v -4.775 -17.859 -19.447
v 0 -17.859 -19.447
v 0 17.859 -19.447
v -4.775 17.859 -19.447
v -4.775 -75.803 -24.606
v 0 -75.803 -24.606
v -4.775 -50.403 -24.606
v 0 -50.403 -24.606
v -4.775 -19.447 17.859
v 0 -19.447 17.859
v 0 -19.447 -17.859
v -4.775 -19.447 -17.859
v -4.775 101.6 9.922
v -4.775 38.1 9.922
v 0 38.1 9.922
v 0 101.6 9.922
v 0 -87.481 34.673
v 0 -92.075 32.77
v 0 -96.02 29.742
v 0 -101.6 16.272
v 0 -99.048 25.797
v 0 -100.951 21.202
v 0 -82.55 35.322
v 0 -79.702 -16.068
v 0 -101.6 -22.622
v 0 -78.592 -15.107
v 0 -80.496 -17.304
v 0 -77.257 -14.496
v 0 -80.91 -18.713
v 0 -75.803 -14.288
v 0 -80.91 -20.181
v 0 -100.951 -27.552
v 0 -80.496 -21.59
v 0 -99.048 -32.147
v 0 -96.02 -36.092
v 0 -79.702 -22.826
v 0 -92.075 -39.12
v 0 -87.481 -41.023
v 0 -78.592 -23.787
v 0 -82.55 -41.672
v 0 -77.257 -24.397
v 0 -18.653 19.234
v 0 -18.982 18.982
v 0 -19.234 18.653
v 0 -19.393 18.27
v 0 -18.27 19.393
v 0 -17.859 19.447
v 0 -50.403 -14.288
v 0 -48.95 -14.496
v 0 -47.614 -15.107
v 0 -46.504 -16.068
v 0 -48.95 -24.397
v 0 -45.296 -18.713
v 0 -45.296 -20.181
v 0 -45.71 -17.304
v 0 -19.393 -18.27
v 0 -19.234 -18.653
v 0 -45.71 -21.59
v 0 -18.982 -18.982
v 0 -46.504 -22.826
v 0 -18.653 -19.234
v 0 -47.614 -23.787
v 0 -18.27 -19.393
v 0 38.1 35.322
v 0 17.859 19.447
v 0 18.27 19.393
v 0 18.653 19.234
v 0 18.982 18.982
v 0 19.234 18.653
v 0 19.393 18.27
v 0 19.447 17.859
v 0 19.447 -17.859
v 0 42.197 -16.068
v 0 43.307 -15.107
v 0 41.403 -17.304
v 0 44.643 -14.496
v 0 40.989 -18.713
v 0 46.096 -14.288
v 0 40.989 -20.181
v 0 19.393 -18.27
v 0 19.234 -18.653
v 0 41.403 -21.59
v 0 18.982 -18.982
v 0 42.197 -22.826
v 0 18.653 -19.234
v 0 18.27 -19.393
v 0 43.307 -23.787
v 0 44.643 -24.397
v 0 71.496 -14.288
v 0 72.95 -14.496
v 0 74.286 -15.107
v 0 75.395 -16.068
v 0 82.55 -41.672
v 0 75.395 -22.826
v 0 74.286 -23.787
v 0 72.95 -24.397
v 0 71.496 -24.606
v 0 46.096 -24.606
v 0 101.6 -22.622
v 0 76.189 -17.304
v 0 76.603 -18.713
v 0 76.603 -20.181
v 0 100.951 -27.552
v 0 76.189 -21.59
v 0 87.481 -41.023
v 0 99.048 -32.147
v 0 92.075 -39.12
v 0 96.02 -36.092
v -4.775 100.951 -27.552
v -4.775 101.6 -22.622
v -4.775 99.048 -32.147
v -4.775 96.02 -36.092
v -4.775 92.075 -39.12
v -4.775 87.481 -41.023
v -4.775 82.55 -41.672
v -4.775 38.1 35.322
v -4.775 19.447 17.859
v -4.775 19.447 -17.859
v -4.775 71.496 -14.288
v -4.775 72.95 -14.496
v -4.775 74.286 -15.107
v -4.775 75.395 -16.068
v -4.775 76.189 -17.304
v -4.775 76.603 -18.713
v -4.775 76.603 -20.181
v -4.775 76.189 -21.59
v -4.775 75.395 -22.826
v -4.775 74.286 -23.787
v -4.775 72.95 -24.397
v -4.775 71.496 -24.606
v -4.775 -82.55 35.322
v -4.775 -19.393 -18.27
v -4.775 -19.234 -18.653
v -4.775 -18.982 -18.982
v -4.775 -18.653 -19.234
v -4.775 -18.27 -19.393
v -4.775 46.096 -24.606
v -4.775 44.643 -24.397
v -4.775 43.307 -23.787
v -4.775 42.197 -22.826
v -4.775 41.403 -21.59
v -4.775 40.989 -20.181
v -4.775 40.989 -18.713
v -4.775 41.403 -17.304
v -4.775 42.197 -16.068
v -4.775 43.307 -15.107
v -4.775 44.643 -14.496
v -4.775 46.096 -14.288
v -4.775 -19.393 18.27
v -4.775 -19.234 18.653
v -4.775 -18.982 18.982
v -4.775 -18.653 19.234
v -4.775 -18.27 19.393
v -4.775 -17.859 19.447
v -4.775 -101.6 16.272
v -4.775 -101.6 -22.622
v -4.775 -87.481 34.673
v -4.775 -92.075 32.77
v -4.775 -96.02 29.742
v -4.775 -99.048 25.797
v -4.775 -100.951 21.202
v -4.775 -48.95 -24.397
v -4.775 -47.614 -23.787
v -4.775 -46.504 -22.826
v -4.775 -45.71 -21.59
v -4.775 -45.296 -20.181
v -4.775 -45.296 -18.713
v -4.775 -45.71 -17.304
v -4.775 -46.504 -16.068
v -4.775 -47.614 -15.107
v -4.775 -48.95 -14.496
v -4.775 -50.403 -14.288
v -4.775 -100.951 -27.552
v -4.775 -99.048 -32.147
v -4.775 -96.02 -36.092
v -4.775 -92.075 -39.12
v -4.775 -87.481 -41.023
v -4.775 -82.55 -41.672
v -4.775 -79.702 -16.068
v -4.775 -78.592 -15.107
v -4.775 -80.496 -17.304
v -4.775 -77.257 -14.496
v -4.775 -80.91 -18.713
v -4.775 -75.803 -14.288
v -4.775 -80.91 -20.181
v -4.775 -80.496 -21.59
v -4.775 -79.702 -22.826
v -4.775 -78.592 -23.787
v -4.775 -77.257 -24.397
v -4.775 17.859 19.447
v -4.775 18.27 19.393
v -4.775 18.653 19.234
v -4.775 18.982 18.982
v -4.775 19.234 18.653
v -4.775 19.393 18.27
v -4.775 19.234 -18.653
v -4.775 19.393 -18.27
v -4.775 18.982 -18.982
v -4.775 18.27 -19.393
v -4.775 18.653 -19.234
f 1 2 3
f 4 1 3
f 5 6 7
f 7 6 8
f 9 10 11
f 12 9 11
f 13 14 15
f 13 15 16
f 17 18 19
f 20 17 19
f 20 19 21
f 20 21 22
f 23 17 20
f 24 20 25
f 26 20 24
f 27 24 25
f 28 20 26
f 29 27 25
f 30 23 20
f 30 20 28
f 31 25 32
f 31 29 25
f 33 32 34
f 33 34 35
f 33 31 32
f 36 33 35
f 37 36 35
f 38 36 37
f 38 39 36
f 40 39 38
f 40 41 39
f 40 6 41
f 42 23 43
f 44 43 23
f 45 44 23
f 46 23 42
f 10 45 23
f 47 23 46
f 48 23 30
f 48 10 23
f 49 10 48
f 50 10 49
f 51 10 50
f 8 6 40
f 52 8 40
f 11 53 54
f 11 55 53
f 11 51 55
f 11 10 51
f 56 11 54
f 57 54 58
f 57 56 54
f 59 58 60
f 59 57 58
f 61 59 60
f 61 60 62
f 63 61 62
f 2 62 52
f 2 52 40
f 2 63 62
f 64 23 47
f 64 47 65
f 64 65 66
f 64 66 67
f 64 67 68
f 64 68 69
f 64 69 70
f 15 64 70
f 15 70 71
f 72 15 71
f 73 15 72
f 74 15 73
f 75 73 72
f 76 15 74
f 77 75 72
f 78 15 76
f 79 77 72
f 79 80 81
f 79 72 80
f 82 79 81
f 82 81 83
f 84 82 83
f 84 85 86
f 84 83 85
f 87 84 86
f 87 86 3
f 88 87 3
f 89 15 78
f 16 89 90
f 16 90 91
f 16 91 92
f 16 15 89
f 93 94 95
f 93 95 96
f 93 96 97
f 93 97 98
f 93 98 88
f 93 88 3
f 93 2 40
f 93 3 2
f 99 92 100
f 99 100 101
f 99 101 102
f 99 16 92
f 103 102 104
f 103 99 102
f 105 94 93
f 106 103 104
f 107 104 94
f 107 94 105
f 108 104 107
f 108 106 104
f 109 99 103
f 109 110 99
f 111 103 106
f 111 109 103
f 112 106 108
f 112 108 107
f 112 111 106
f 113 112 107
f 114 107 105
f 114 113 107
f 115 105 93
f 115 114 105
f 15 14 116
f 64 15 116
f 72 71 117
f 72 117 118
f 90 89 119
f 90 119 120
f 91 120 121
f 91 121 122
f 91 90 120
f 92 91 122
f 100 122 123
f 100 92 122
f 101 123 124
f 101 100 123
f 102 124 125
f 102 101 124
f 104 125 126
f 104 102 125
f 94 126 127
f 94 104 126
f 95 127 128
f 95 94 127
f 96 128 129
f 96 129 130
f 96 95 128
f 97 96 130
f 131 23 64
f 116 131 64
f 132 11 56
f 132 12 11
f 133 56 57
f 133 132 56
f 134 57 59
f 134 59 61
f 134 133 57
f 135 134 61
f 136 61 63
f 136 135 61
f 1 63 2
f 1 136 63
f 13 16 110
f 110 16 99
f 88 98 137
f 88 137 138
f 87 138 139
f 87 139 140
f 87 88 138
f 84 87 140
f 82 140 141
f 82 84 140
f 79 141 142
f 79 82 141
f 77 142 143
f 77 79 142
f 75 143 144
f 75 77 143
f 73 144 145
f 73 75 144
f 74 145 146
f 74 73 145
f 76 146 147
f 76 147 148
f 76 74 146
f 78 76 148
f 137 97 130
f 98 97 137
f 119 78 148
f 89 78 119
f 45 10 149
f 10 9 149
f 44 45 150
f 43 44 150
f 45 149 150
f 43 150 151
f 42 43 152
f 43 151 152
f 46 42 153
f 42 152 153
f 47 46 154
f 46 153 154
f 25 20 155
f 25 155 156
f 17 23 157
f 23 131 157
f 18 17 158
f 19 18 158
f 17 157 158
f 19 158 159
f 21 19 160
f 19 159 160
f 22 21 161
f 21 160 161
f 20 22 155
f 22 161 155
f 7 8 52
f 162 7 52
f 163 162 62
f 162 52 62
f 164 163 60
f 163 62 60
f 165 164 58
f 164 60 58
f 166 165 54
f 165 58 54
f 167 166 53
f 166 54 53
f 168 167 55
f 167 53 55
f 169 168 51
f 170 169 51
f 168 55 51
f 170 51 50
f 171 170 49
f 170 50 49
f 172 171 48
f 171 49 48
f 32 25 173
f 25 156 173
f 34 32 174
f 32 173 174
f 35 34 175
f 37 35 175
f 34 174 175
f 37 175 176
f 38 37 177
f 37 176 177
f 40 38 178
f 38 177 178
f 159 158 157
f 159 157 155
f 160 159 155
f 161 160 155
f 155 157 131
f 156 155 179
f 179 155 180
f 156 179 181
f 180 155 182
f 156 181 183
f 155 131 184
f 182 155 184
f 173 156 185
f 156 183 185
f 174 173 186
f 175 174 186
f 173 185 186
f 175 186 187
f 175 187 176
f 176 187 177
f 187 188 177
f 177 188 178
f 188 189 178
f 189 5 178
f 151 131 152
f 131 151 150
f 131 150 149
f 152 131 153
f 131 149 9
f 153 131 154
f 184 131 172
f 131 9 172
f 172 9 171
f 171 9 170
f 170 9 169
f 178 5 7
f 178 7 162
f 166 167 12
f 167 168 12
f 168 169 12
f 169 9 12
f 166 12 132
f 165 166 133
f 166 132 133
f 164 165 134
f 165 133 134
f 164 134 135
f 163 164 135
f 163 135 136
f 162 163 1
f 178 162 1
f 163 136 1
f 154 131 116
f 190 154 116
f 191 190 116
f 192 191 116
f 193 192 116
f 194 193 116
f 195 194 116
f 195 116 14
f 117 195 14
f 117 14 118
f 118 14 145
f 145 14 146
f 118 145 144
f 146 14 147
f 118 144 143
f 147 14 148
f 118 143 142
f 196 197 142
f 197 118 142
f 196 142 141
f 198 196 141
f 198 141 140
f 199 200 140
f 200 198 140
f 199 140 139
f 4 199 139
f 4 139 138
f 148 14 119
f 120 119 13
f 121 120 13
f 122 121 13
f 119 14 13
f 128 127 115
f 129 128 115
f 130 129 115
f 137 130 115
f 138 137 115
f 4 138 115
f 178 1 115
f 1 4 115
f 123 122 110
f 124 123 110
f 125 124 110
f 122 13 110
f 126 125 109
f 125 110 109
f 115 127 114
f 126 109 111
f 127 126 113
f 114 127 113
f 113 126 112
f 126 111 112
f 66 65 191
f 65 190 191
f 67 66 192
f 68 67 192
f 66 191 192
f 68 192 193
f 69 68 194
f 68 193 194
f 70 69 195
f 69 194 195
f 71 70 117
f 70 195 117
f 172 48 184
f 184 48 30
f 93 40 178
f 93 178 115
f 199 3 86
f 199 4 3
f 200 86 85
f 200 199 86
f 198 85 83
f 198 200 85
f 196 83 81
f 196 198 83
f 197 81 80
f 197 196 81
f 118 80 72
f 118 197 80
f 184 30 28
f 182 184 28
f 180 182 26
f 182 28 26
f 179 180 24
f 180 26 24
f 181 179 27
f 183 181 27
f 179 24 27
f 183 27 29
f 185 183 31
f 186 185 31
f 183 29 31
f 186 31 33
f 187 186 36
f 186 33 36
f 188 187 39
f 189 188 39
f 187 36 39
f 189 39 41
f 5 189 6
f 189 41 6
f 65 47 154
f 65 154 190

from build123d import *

# Parameters (mm, degrees)
SKETCH1_W          = 76.99375
SKETCH1_H          = 203.2
SKETCH1_W_2        = 38.89375
SKETCH1_H_2        = 38.89375
BASE_FLANGE1_DEPTH = 4.7752
FILLET1_R          = 1.5875
FILLET2_R          = 19.05
SKETCH2_W          = 25.4
SKETCH2_H          = 63.5
CUT_EXTRUDE1_DEPTH = 110.917731513


# Sheet-metal steps are written as plain solids
with BuildPart() as part:
    # Sketch1 → Base-Flange1 (new body)
    with BuildSketch(Plane(origin=(0, 0, 0), x_dir=(0, 0, -1), z_dir=(1, 0, 0))):
        with Locations((3.175, 0)):
            Rectangle(SKETCH1_W, SKETCH1_H)
        Rectangle(SKETCH1_W_2, SKETCH1_H_2, mode=Mode.SUBTRACT)
        with BuildLine():
            Line((24.60625, 71.496159823), (24.60625, 46.096159823))
            ThreePointArc((24.60625, 46.096159823), (19.446875, 40.936784823), (14.2875, 46.096159823))
            Line((14.2875, 46.096159823), (14.2875, 71.496159823))
            ThreePointArc((14.2875, 71.496159823), (19.446875, 76.655534823), (24.60625, 71.496159823))
        make_face(mode=Mode.SUBTRACT)
        with BuildLine():
            Line((24.60625, -75.803125), (24.60625, -50.403125))
            ThreePointArc((24.60625, -50.403125), (19.446875, -45.24375), (14.2875, -50.403125))
            Line((14.2875, -50.403125), (14.2875, -75.803125))
            ThreePointArc((14.2875, -75.803125), (19.446875, -80.9625), (24.60625, -75.803125))
        make_face(mode=Mode.SUBTRACT)
    extrude(amount=-BASE_FLANGE1_DEPTH)

    # Fillet1
    fillet1_edges = [part.edges().sort_by_distance(p)[0] for p in [
        (-2.3876, -19.446875, 19.446875),
        (-2.3876, 19.446875, 19.446875),
        (-2.3876, 19.446875, -19.446875),
        (-2.3876, -19.446875, -19.446875),
    ]]
    fillet(fillet1_edges, radius=FILLET1_R)

    # Fillet2
    fillet2_edges = [part.edges().sort_by_distance(p)[0] for p in [
        (-2.3876, -101.6, -41.671875),
        (-2.3876, -101.6, 35.321875),
        (-2.3876, 101.6, 35.321875),
        (-2.3876, 101.6, -41.671875),
    ]]
    fillet(fillet2_edges, radius=FILLET2_R)

    # Sketch2 → Cut-Extrude1 (cut, through all)
    with BuildSketch(Plane.ZY.offset(4.7752)):
        with Locations((22.621875, 69.85)):
            Rectangle(SKETCH2_W, SKETCH2_H)
    extrude(amount=-CUT_EXTRUDE1_DEPTH, mode=Mode.SUBTRACT)


solid = part.part
